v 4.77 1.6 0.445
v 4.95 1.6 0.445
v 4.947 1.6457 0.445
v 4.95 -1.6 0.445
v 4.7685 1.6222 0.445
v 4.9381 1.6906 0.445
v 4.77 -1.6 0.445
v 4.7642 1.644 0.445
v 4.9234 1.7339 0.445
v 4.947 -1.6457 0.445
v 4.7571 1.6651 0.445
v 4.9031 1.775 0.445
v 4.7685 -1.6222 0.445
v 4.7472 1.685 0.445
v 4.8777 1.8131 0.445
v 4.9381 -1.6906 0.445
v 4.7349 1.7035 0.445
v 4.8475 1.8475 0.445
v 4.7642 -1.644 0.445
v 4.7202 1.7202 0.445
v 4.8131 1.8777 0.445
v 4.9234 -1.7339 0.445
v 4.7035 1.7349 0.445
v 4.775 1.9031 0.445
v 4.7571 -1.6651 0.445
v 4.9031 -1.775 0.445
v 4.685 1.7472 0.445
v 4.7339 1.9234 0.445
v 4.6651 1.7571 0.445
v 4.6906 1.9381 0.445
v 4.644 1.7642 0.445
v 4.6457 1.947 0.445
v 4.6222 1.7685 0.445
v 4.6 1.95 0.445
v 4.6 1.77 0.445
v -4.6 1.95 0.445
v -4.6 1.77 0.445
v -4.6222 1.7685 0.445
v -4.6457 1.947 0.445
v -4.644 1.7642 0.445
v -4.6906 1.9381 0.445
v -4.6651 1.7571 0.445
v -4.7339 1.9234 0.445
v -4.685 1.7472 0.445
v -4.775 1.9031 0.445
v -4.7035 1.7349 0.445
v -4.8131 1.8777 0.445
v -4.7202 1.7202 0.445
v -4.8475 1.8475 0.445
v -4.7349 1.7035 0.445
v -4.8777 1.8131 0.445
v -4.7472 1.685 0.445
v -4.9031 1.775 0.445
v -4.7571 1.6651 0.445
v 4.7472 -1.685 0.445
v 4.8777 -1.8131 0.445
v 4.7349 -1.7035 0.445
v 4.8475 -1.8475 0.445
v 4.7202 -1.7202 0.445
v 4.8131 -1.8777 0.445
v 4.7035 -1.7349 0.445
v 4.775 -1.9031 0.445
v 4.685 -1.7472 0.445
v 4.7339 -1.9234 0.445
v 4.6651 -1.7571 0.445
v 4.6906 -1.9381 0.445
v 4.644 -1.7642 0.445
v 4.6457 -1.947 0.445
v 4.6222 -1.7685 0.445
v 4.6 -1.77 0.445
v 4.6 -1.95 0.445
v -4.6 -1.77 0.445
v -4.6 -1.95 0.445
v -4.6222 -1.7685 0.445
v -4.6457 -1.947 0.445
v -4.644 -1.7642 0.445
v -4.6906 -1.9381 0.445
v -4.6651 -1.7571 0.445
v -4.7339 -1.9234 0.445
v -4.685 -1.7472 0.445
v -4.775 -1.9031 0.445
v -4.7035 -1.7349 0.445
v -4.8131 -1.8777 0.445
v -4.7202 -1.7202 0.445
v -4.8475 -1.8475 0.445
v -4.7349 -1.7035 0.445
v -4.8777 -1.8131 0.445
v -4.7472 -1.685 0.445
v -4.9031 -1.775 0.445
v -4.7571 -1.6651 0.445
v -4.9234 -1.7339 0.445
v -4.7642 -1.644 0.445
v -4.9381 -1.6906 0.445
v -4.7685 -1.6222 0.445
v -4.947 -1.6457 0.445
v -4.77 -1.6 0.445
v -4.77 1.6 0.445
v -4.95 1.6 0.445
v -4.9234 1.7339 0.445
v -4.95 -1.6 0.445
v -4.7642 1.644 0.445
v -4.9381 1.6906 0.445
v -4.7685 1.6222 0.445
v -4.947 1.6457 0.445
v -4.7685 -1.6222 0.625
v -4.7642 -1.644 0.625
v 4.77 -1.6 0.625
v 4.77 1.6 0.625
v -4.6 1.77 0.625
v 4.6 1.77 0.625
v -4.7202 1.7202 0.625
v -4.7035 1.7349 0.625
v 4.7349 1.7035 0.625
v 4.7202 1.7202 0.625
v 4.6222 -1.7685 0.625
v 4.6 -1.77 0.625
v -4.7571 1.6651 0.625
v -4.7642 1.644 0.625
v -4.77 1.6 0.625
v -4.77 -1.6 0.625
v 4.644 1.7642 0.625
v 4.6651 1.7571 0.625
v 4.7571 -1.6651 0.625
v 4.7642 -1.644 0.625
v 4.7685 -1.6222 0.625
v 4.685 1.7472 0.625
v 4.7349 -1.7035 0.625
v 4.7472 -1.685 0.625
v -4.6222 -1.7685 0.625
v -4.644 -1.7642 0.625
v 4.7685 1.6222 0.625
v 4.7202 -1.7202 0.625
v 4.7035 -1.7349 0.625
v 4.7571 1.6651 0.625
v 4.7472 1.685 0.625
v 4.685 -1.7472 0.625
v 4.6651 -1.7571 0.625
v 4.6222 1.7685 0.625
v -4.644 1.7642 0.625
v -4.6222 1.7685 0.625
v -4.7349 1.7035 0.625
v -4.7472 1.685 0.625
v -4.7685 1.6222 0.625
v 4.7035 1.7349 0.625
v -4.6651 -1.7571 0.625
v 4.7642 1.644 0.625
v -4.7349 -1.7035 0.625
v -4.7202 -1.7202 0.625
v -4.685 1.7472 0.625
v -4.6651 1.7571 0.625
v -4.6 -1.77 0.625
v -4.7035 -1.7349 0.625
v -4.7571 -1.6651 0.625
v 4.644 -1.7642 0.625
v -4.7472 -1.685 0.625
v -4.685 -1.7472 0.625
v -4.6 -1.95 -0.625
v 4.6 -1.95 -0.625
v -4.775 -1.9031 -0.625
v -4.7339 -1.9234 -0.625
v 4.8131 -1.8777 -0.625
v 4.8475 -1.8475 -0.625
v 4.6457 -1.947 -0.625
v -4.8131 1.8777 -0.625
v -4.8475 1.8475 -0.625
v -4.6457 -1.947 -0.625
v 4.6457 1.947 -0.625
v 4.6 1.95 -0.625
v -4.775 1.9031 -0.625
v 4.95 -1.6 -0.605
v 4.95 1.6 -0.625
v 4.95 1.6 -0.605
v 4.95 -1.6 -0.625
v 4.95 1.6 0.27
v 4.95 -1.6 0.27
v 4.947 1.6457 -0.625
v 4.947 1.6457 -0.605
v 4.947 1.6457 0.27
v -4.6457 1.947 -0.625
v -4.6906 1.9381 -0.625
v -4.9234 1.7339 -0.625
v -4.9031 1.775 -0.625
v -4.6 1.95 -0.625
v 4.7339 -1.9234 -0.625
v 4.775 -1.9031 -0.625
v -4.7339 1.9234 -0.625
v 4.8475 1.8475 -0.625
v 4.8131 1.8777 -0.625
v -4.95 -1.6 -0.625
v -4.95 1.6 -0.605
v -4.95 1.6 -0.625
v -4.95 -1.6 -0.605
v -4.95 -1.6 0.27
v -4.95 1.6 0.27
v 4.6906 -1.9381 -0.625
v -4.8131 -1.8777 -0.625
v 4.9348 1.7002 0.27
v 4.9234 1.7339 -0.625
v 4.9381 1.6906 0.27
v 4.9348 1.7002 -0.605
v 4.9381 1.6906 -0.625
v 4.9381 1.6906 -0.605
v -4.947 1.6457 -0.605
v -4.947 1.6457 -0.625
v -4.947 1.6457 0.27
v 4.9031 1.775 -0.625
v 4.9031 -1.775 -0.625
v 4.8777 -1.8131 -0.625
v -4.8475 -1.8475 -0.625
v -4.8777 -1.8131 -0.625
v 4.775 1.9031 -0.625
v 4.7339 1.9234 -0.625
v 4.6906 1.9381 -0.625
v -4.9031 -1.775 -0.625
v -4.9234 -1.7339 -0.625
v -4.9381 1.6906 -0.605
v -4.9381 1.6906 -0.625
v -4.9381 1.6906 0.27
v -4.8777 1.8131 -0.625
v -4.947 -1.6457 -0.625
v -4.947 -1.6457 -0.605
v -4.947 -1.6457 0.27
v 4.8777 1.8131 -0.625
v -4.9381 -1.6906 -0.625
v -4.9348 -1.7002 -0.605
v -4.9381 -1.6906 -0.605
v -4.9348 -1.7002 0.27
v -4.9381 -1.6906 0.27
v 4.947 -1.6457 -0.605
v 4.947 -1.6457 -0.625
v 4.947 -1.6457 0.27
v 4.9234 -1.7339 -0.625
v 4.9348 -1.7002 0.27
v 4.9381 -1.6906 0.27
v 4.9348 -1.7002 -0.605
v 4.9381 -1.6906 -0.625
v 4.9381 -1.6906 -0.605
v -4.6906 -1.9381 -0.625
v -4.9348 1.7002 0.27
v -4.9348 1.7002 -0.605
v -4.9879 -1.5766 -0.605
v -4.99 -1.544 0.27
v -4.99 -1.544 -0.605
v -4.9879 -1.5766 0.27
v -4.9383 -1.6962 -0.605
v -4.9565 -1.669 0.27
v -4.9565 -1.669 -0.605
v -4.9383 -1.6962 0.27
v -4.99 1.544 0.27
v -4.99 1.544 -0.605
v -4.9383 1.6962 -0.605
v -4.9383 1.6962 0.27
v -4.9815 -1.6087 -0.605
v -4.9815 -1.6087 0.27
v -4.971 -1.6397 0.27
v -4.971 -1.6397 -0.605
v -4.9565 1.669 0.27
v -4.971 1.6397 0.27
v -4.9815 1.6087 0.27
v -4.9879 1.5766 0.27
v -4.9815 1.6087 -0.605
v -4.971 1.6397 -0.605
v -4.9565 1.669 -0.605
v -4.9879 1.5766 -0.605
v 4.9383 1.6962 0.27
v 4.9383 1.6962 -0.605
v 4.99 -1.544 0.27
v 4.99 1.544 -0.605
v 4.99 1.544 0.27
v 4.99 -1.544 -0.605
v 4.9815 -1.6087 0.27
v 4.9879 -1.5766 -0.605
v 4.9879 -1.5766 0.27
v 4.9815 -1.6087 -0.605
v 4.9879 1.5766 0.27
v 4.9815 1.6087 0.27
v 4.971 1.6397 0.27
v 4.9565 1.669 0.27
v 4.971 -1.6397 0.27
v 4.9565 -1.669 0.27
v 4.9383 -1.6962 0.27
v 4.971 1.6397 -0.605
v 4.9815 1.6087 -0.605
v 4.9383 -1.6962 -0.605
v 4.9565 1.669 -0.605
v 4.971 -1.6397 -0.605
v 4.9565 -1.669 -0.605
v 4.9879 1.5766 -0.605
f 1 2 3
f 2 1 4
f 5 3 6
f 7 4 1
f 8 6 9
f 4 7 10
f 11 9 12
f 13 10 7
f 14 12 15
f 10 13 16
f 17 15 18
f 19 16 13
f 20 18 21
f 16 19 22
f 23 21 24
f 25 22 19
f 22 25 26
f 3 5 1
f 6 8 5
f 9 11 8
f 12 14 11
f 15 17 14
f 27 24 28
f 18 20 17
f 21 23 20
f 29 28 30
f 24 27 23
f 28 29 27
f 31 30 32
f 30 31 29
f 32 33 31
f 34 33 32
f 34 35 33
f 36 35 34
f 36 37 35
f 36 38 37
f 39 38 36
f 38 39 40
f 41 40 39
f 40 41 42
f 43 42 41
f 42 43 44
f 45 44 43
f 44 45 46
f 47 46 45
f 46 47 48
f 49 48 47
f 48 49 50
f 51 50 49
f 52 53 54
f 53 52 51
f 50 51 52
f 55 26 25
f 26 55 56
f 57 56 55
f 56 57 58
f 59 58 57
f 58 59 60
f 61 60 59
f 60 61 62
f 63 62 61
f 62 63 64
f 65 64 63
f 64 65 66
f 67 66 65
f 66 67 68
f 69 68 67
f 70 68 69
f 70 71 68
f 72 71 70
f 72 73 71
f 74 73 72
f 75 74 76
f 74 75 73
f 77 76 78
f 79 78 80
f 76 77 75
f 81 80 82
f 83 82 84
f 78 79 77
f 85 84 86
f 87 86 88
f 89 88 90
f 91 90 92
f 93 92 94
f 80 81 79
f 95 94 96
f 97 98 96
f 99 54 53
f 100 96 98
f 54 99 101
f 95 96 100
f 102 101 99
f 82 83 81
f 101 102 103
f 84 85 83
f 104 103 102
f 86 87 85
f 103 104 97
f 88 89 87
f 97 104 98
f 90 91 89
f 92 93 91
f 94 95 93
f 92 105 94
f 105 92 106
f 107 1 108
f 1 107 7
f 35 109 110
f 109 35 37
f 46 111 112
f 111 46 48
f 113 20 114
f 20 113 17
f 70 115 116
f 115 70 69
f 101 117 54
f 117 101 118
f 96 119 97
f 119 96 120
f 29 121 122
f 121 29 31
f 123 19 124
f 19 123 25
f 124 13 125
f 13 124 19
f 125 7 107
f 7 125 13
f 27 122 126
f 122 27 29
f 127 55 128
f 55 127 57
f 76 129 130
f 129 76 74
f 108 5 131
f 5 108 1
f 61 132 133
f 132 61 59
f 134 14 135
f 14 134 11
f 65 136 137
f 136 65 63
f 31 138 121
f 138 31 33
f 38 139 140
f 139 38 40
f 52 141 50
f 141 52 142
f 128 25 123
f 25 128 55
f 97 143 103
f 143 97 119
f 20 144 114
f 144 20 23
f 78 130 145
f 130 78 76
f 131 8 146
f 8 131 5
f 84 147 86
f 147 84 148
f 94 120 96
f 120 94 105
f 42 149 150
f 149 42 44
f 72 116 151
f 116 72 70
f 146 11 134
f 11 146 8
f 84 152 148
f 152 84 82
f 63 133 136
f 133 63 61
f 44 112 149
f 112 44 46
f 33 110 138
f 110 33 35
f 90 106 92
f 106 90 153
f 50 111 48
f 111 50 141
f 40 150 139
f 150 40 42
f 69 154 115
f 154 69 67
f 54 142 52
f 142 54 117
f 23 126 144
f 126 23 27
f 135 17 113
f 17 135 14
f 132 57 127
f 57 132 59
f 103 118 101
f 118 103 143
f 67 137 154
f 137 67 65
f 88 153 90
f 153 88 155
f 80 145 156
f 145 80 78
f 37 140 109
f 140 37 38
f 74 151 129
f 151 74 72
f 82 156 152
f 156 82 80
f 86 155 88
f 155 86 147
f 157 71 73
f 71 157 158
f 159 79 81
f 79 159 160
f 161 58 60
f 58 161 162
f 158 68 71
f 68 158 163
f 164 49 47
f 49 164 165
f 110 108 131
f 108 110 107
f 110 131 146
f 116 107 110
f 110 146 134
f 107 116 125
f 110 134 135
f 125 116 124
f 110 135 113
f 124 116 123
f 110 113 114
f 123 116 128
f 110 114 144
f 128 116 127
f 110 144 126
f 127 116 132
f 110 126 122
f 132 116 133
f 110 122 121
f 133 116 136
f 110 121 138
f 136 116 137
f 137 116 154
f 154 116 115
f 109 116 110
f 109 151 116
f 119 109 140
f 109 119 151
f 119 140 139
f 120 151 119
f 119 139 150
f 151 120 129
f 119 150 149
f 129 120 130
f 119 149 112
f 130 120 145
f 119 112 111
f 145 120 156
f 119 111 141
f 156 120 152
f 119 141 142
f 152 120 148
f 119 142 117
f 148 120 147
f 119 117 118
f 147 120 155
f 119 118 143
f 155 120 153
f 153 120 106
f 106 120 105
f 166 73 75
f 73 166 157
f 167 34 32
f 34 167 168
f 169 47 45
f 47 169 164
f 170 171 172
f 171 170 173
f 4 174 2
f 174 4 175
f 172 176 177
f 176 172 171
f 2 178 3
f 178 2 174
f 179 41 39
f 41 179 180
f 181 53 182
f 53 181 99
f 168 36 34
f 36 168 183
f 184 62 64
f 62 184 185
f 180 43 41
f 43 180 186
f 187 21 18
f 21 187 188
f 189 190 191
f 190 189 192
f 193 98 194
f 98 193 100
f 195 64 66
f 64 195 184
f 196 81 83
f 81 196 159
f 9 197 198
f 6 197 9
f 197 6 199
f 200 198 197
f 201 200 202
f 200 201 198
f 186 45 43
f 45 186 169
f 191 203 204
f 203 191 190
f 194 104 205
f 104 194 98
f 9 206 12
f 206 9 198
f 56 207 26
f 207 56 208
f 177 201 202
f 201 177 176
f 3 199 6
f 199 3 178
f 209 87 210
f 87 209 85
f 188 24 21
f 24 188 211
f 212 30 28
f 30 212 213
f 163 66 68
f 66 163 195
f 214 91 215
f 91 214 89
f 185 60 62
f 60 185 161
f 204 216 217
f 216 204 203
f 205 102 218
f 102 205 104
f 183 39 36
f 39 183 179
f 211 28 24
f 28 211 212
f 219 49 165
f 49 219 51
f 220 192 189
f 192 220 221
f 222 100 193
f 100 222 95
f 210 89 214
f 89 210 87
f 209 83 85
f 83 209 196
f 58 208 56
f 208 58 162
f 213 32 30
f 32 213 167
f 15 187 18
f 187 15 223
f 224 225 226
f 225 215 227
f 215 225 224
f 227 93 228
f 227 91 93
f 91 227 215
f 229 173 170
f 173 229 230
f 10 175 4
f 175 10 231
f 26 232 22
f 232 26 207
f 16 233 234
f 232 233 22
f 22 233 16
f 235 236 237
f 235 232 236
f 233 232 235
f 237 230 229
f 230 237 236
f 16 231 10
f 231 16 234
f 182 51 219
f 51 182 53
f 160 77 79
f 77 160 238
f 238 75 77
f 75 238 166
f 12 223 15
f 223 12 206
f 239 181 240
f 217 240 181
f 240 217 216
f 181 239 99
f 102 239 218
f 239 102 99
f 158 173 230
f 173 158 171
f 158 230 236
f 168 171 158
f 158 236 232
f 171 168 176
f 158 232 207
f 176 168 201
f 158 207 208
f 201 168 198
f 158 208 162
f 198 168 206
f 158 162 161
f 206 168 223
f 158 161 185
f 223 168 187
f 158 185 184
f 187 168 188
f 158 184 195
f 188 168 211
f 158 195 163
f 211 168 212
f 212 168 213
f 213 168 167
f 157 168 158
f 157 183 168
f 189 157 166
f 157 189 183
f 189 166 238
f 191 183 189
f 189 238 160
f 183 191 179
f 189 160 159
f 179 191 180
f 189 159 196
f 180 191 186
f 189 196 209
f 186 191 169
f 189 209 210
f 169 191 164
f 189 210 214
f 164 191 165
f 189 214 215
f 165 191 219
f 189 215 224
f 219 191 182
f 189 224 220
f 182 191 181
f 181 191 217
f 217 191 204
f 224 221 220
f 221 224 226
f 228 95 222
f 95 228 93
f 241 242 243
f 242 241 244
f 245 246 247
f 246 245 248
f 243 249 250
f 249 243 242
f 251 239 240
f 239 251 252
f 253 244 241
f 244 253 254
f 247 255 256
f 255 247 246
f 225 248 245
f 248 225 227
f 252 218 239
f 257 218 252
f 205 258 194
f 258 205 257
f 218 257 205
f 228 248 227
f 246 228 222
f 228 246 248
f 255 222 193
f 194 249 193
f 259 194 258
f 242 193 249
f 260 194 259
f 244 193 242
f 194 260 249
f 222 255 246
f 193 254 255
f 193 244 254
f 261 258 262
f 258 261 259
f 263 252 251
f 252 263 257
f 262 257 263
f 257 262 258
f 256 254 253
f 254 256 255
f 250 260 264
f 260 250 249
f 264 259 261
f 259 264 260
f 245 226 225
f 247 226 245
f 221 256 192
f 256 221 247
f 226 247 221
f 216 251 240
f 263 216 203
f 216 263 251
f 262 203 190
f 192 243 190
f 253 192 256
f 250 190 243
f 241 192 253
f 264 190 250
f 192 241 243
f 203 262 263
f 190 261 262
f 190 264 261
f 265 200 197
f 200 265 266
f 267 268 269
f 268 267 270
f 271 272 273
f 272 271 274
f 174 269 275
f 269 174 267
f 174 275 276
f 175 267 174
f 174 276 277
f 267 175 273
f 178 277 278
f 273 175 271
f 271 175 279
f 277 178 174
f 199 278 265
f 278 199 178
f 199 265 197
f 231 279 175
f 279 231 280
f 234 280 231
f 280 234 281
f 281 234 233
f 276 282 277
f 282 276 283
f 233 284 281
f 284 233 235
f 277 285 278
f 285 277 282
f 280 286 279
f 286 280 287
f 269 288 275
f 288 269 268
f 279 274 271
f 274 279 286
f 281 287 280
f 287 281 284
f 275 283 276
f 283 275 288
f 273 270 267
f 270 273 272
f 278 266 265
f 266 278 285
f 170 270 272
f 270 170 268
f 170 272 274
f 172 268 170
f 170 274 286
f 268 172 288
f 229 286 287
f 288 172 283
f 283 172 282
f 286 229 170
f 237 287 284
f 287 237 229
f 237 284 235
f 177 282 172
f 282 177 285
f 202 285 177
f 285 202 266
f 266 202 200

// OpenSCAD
// SMD package overall dimensions (mm)
body_length = 9.90;
body_width  = 3.90;
body_height = 1.25;

$fn = 48;

// Small helper: rounded rectangular prism via hull of corner cylinders
module rounded_box(size=[10,4,1], r=0.2, center=true) {
    x = size[0]; y = size[1]; z = size[2];
    rr = min(r, x/2, y/2);
    translate(center ? [0,0,0] : [x/2,y/2,z/2])
        hull() {
            for (sx = [-1, 1], sy = [-1, 1])
                translate([sx*(x/2-rr), sy*(y/2-rr), 0])
                    cylinder(r=rr, h=z, center=true);
        }
}

// Main SMD model: one connected solid with terminations + subtle top chamfer
module smd() {
    // Termination (metal end) proportions
    term_len = body_length * 0.12;                 // each end length
    term_h   = body_height * 0.70;                 // slightly shorter than body
    term_w   = body_width  * 0.92;                 // slightly inset from sides
    term_r   = min(0.25, term_len*0.45, term_w*0.20);

    // Body rounding/chamfer
    body_r   = min(0.35, body_width*0.12, body_length*0.06);
    chamfer  = min(0.18, body_height*0.18);        // subtle top edge chamfer
    eps      = 0.02;

    union() {
        // Ceramic body with a slight top chamfer (difference keeps it one solid)
        color([0.85, 0.85, 0.80])
        difference() {
            rounded_box([body_length, body_width, body_height], r=body_r, center=true);

            // Chamfer cut: remove a thin "ring" near the top edges
            translate([0, 0, body_height/2 - chamfer/2 + eps])
                difference() {
                    rounded_box([body_length + 2*eps, body_width + 2*eps, chamfer + 2*eps],
                                r=max(body_r - 0.05, 0.01), center=true);
                    rounded_box([body_length - 2*chamfer, body_width - 2*chamfer, chamfer + 4*eps],
                                r=max(body_r - chamfer, 0.01), center=true);
                }
        }

        // Metal terminations (connected, slightly overlapping into body)
        color([0.75, 0.75, 0.78])
        for (sx = [-1, 1]) {
            translate([sx*(body_length/2 - term_len/2 + eps), 0, -body_height/2 + term_h/2 + eps])
                rounded_box([term_len + 2*eps, term_w, term_h], r=term_r, center=true);
        }
    }
}

// Final output
smd();
